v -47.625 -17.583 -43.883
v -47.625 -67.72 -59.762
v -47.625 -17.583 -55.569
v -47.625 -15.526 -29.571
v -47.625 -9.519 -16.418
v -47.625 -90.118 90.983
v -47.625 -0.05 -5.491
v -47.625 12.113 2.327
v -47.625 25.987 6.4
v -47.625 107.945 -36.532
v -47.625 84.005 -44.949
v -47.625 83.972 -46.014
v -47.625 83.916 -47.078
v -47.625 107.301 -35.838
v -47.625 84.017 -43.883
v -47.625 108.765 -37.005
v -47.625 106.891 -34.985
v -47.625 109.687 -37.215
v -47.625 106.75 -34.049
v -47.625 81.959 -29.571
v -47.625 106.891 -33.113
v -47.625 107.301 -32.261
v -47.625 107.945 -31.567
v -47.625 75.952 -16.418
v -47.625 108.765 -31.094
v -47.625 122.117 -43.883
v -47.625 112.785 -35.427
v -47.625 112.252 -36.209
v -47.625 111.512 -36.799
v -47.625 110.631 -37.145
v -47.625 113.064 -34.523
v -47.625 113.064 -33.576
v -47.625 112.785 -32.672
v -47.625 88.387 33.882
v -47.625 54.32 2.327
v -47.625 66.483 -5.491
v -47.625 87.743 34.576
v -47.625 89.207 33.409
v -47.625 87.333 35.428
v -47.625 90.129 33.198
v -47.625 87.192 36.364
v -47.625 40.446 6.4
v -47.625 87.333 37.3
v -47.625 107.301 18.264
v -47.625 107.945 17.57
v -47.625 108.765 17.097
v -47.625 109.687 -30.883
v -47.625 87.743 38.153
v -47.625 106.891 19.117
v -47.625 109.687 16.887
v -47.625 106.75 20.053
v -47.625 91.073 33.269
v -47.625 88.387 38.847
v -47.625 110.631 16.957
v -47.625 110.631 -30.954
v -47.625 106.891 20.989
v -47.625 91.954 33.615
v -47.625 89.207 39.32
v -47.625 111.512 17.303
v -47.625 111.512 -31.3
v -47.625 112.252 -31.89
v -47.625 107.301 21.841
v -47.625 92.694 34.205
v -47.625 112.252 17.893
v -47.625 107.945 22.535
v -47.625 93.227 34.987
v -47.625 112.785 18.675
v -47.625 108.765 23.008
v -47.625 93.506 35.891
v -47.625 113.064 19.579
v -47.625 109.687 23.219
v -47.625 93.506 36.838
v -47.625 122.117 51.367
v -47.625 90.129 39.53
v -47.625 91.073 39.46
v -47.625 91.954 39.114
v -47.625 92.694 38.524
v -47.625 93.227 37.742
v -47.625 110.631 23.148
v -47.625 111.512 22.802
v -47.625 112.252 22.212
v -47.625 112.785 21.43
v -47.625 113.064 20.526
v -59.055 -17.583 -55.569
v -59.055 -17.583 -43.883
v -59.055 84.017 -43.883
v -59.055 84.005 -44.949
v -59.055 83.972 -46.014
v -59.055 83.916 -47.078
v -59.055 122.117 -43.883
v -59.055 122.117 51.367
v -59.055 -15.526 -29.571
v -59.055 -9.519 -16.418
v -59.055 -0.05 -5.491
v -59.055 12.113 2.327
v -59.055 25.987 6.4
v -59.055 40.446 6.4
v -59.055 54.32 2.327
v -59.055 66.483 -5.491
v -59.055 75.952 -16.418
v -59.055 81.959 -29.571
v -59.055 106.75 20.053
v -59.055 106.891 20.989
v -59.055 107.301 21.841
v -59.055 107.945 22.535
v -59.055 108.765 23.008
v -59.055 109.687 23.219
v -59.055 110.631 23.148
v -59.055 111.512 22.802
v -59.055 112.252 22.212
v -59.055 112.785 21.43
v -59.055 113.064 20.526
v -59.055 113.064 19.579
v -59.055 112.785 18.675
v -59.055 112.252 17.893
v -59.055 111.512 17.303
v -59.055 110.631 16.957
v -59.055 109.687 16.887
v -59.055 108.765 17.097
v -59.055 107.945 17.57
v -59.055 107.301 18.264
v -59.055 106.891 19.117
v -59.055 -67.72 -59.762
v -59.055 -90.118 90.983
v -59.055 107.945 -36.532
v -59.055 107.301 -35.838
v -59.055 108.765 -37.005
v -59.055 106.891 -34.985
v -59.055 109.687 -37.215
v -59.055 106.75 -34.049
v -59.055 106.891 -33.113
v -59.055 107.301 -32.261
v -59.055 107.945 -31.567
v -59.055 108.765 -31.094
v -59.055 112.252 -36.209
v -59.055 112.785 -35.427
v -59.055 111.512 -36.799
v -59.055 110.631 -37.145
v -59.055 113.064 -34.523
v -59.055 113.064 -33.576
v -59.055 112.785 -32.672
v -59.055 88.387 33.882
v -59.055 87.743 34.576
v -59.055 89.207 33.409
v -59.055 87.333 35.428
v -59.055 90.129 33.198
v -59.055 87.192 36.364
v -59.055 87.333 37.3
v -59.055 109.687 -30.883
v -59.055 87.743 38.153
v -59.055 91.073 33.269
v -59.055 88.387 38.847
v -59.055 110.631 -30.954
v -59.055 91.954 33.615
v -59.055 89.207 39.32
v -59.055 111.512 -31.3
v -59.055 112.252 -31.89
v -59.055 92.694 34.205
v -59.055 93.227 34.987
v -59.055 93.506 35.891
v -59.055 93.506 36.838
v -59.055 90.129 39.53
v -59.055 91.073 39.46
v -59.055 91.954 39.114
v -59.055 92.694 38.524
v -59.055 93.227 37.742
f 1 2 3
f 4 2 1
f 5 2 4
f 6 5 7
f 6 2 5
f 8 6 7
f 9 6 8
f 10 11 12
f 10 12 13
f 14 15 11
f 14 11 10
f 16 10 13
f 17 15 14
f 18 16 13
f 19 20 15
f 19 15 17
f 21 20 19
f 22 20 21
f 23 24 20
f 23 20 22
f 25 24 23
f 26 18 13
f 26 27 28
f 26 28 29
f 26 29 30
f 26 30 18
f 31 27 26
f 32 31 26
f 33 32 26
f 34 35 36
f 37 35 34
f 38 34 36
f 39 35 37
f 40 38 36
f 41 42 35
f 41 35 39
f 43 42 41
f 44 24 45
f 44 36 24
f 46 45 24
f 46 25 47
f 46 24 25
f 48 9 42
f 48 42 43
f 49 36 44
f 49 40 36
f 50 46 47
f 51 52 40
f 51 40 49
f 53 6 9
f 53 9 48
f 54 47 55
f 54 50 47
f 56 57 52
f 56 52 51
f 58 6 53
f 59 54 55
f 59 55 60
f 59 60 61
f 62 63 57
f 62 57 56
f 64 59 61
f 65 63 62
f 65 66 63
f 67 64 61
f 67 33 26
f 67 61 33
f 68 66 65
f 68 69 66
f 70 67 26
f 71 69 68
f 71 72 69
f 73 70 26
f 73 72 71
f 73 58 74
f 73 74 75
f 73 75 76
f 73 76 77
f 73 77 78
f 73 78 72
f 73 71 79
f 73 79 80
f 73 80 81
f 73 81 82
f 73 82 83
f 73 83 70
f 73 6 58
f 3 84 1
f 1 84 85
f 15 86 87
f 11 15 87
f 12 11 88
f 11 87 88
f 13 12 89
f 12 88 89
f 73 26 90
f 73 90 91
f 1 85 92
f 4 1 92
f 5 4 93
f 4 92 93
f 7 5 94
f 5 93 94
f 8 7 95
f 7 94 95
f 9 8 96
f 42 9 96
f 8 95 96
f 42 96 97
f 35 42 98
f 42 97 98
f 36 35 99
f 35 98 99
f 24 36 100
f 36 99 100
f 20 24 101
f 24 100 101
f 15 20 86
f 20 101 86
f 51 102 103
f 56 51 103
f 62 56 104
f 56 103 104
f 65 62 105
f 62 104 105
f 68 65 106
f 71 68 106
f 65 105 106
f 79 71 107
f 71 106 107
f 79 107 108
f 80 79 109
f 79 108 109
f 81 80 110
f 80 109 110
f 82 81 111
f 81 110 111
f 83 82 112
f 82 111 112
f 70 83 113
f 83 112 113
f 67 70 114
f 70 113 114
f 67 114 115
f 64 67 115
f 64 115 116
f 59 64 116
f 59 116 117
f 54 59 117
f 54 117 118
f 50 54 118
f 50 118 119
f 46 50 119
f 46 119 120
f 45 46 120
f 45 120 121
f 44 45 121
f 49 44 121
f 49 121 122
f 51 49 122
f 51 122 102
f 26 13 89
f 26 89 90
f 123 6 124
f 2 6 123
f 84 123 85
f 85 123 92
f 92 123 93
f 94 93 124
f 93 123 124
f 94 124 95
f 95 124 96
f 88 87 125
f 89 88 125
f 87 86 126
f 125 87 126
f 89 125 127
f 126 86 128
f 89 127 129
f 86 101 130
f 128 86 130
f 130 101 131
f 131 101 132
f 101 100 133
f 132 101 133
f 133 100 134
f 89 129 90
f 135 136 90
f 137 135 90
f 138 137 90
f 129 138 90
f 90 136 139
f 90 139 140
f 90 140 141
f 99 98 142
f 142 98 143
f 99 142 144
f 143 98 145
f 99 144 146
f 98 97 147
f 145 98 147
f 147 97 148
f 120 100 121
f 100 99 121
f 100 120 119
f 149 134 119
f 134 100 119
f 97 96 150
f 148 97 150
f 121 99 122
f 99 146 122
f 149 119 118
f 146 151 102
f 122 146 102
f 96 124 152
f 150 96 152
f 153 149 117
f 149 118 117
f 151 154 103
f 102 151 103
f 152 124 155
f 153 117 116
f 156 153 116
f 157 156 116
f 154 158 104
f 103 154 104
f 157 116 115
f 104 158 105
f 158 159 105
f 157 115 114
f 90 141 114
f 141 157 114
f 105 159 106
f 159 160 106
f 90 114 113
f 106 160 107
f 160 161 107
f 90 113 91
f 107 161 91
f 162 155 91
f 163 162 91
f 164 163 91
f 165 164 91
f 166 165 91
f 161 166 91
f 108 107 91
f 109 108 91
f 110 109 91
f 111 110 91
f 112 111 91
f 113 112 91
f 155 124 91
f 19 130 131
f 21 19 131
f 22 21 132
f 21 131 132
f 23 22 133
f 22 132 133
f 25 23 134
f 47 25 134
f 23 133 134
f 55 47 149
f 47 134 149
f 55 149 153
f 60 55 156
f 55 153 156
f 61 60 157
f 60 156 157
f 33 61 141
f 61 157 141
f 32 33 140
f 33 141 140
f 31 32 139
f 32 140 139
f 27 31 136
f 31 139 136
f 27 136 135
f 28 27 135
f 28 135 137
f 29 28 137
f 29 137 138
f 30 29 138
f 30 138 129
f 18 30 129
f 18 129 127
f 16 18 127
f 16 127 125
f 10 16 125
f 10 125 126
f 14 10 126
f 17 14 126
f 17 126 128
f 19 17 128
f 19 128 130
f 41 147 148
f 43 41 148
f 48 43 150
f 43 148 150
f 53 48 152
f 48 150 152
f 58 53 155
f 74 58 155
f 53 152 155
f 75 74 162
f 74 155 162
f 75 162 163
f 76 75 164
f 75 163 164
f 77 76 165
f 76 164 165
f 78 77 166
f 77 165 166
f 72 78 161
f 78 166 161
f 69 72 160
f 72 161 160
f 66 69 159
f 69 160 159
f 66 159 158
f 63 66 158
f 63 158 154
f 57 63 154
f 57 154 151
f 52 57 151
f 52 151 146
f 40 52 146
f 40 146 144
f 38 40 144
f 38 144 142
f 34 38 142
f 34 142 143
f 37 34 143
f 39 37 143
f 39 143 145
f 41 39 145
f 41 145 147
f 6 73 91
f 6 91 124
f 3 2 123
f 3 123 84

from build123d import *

# Parameters (mm, degrees)
F0_R      = 3.175
F1_DEPTH  = 11.43
F5_DEPTH  = 25.4
F6_D      = 6.35
F6_DEPTH  = 76.2
F6_TIP    = 1.9077324654
F7_D      = 6.35
F7_DEPTH  = 76.2
F7_TIP    = 1.9077324654
F8_D      = 6.35
F8_DEPTH  = 76.2
F8_TIP    = 1.9077324654
F9_D      = 6.35
F9_DEPTH  = 76.2
F9_TIP    = 1.9077324654
F11_DEPTH = 95.25


with BuildPart() as f1:
    # F0 (on Right) → F1 (new body)
    with BuildSketch(Plane.YZ):
        Polygon((122.1165703362, -43.8827651219), (122.1165703362, 51.3672348781), (-90.1177801321, 90.9827682114), (-67.7204277456, -59.7624426779), align=None)
        with Locations((109.9245703362, -34.0493256675)):
            Circle(F0_R, mode=Mode.SUBTRACT)
        with Locations((109.9245703362, 20.0526743325)):
            Circle(F0_R, mode=Mode.SUBTRACT)
        with Locations((90.3665703362, 36.3643222504)):
            Circle(F0_R, mode=Mode.SUBTRACT)
        with Locations((90.3665703362, 36.3643222504)):
            Circle(F0_R)
        with Locations((109.9245703362, 20.0526743325)):
            Circle(F0_R)
        with Locations((109.9245703362, -34.0493256675)):
            Circle(F0_R)
    extrude(amount=F1_DEPTH)


with BuildPart() as f1_1:
    # F2: moved
    add(f1.part.moved(Location((47.625, 0, 0))))


with BuildPart() as f3_1:
    # F3: instance of F1
    add(f1_1.part.mirror(Plane.YZ))

    # F4 (on face) → F5 (cut)
    with BuildSketch(Plane(origin=(-59.055, 0, 0), x_dir=(0, -1, 0), z_dir=(-1, 0, 0))):
        with BuildLine():
            ThreePointArc((17.5834296638, -43.8827651219), (-33.2165703362, 6.9172348781), (-84.0165703362, -43.8827651219))
            ThreePointArc((-84.0165703362, -43.8827651219), (-83.9914140751, -45.4812779607), (-83.9159702065, -47.0782076259))
            Line((-83.9159702065, -47.0782076259), (16.2473795848, -55.4567729935))
            ThreePointArc((16.2473795848, -55.4567729935), (17.2483117898, -49.7081983252), (17.5834296638, -43.8827651219))
        make_face()
        with BuildLine():
            Line((17.5834296638, -55.5685322642), (17.5834296638, -43.8827651219))
            ThreePointArc((17.5834296638, -43.8827651219), (17.2483117898, -49.7081983252), (16.2473795848, -55.4567729935))
            Line((16.2473795848, -55.4567729935), (17.5834296638, -55.5685322642))
        make_face()
    extrude(amount=-F5_DEPTH, mode=Mode.SUBTRACT)

    # F6
    with Locations(Plane.YZ):
        with Locations((90.3665703362, 36.3643222504)):
            Hole(F6_D / 2, depth=F6_DEPTH)
            with Locations((0, 0, -(F6_DEPTH + F6_TIP / 2))):  # 118° drill point
                Cone(0, F6_D / 2, F6_TIP, mode=Mode.SUBTRACT)

    # F7
    with Locations(Plane.YZ):
        with Locations((109.9245703362, 20.0526743325)):
            Hole(F7_D / 2, depth=F7_DEPTH)
            with Locations((0, 0, -(F7_DEPTH + F7_TIP / 2))):  # 118° drill point
                Cone(0, F7_D / 2, F7_TIP, mode=Mode.SUBTRACT)

    # F8
    with Locations(Plane.YZ):
        with Locations((109.9245703362, -34.0493256675)):
            Hole(F8_D / 2, depth=F8_DEPTH)
            with Locations((0, 0, -(F8_DEPTH + F8_TIP / 2))):  # 118° drill point
                Cone(0, F8_D / 2, F8_TIP, mode=Mode.SUBTRACT)


with BuildPart() as f1_2:
    add(f1_1.part)

    # F9
    with Locations(Plane(origin=(0, 0, 0), x_dir=(0, 1, 0), z_dir=(-1, 0, 0))):
        with Locations((90.3665703362, -36.3643222504)):
            Hole(F9_D / 2, depth=F9_DEPTH)
            with Locations((0, 0, -(F9_DEPTH + F9_TIP / 2))):  # 118° drill point
                Cone(0, F9_D / 2, F9_TIP, mode=Mode.SUBTRACT)


with BuildPart() as f11:
    # F10 (on face) → F11 (new body)
    with BuildSketch(Plane(origin=(47.625, 0, 0), x_dir=(0, -1, 0), z_dir=(-1, 0, 0))):
        with BuildLine():
            Line((46.0226261079, 141.3909337274), (55.0595276774, 113.1756901692))
            ThreePointArc((55.0595276774, 113.1756901692), (61.2467442889, 100.0992346093), (66.2609327925, 86.5296637591))
            Line((66.2609327925, 86.5296637591), (48.4415836851, 142.1656880364))
            Line((48.4415836851, 142.1656880364), (46.0226261079, 141.3909337274))
        make_face()
        with BuildLine():
            Line((55.0595276774, 113.1756901692), (63.7442887749, 86.0599085345))
            Line((63.7442887749, 86.0599085345), (66.2609327925, 86.5296637591))
            ThreePointArc((66.2609327925, 86.5296637591), (61.2467442889, 100.0992346093), (55.0595276774, 113.1756901692))
        make_face()
        with BuildLine():
            Line((63.7442887749, 86.0599085345), (63.7439748969, 86.0598499462))
            ThreePointArc((63.7439748969, 86.0598499462), (69.5928864987, 61.5174094181), (71.5584296638, 36.3643222504))
            ThreePointArc((71.5584296638, 36.3643222504), (66.8411203346, -2.4357759317), (52.9640480804, -38.9751723676))
            Line((52.9640480804, -38.9751723676), (55.2290606215, -40.1252095237))
            ThreePointArc((55.2290606215, -40.1252095237), (69.3114207434, -3.0269888444), (74.0984296638, 36.3643222504))
            ThreePointArc((74.0984296638, 36.3643222504), (72.1272426646, 61.7512669557), (66.2609327925, 86.5296637591))
            Line((66.2609327925, 86.5296637591), (63.7442887749, 86.0599085345))
        make_face()
    extrude(amount=F11_DEPTH)


solid = f3_1.part
